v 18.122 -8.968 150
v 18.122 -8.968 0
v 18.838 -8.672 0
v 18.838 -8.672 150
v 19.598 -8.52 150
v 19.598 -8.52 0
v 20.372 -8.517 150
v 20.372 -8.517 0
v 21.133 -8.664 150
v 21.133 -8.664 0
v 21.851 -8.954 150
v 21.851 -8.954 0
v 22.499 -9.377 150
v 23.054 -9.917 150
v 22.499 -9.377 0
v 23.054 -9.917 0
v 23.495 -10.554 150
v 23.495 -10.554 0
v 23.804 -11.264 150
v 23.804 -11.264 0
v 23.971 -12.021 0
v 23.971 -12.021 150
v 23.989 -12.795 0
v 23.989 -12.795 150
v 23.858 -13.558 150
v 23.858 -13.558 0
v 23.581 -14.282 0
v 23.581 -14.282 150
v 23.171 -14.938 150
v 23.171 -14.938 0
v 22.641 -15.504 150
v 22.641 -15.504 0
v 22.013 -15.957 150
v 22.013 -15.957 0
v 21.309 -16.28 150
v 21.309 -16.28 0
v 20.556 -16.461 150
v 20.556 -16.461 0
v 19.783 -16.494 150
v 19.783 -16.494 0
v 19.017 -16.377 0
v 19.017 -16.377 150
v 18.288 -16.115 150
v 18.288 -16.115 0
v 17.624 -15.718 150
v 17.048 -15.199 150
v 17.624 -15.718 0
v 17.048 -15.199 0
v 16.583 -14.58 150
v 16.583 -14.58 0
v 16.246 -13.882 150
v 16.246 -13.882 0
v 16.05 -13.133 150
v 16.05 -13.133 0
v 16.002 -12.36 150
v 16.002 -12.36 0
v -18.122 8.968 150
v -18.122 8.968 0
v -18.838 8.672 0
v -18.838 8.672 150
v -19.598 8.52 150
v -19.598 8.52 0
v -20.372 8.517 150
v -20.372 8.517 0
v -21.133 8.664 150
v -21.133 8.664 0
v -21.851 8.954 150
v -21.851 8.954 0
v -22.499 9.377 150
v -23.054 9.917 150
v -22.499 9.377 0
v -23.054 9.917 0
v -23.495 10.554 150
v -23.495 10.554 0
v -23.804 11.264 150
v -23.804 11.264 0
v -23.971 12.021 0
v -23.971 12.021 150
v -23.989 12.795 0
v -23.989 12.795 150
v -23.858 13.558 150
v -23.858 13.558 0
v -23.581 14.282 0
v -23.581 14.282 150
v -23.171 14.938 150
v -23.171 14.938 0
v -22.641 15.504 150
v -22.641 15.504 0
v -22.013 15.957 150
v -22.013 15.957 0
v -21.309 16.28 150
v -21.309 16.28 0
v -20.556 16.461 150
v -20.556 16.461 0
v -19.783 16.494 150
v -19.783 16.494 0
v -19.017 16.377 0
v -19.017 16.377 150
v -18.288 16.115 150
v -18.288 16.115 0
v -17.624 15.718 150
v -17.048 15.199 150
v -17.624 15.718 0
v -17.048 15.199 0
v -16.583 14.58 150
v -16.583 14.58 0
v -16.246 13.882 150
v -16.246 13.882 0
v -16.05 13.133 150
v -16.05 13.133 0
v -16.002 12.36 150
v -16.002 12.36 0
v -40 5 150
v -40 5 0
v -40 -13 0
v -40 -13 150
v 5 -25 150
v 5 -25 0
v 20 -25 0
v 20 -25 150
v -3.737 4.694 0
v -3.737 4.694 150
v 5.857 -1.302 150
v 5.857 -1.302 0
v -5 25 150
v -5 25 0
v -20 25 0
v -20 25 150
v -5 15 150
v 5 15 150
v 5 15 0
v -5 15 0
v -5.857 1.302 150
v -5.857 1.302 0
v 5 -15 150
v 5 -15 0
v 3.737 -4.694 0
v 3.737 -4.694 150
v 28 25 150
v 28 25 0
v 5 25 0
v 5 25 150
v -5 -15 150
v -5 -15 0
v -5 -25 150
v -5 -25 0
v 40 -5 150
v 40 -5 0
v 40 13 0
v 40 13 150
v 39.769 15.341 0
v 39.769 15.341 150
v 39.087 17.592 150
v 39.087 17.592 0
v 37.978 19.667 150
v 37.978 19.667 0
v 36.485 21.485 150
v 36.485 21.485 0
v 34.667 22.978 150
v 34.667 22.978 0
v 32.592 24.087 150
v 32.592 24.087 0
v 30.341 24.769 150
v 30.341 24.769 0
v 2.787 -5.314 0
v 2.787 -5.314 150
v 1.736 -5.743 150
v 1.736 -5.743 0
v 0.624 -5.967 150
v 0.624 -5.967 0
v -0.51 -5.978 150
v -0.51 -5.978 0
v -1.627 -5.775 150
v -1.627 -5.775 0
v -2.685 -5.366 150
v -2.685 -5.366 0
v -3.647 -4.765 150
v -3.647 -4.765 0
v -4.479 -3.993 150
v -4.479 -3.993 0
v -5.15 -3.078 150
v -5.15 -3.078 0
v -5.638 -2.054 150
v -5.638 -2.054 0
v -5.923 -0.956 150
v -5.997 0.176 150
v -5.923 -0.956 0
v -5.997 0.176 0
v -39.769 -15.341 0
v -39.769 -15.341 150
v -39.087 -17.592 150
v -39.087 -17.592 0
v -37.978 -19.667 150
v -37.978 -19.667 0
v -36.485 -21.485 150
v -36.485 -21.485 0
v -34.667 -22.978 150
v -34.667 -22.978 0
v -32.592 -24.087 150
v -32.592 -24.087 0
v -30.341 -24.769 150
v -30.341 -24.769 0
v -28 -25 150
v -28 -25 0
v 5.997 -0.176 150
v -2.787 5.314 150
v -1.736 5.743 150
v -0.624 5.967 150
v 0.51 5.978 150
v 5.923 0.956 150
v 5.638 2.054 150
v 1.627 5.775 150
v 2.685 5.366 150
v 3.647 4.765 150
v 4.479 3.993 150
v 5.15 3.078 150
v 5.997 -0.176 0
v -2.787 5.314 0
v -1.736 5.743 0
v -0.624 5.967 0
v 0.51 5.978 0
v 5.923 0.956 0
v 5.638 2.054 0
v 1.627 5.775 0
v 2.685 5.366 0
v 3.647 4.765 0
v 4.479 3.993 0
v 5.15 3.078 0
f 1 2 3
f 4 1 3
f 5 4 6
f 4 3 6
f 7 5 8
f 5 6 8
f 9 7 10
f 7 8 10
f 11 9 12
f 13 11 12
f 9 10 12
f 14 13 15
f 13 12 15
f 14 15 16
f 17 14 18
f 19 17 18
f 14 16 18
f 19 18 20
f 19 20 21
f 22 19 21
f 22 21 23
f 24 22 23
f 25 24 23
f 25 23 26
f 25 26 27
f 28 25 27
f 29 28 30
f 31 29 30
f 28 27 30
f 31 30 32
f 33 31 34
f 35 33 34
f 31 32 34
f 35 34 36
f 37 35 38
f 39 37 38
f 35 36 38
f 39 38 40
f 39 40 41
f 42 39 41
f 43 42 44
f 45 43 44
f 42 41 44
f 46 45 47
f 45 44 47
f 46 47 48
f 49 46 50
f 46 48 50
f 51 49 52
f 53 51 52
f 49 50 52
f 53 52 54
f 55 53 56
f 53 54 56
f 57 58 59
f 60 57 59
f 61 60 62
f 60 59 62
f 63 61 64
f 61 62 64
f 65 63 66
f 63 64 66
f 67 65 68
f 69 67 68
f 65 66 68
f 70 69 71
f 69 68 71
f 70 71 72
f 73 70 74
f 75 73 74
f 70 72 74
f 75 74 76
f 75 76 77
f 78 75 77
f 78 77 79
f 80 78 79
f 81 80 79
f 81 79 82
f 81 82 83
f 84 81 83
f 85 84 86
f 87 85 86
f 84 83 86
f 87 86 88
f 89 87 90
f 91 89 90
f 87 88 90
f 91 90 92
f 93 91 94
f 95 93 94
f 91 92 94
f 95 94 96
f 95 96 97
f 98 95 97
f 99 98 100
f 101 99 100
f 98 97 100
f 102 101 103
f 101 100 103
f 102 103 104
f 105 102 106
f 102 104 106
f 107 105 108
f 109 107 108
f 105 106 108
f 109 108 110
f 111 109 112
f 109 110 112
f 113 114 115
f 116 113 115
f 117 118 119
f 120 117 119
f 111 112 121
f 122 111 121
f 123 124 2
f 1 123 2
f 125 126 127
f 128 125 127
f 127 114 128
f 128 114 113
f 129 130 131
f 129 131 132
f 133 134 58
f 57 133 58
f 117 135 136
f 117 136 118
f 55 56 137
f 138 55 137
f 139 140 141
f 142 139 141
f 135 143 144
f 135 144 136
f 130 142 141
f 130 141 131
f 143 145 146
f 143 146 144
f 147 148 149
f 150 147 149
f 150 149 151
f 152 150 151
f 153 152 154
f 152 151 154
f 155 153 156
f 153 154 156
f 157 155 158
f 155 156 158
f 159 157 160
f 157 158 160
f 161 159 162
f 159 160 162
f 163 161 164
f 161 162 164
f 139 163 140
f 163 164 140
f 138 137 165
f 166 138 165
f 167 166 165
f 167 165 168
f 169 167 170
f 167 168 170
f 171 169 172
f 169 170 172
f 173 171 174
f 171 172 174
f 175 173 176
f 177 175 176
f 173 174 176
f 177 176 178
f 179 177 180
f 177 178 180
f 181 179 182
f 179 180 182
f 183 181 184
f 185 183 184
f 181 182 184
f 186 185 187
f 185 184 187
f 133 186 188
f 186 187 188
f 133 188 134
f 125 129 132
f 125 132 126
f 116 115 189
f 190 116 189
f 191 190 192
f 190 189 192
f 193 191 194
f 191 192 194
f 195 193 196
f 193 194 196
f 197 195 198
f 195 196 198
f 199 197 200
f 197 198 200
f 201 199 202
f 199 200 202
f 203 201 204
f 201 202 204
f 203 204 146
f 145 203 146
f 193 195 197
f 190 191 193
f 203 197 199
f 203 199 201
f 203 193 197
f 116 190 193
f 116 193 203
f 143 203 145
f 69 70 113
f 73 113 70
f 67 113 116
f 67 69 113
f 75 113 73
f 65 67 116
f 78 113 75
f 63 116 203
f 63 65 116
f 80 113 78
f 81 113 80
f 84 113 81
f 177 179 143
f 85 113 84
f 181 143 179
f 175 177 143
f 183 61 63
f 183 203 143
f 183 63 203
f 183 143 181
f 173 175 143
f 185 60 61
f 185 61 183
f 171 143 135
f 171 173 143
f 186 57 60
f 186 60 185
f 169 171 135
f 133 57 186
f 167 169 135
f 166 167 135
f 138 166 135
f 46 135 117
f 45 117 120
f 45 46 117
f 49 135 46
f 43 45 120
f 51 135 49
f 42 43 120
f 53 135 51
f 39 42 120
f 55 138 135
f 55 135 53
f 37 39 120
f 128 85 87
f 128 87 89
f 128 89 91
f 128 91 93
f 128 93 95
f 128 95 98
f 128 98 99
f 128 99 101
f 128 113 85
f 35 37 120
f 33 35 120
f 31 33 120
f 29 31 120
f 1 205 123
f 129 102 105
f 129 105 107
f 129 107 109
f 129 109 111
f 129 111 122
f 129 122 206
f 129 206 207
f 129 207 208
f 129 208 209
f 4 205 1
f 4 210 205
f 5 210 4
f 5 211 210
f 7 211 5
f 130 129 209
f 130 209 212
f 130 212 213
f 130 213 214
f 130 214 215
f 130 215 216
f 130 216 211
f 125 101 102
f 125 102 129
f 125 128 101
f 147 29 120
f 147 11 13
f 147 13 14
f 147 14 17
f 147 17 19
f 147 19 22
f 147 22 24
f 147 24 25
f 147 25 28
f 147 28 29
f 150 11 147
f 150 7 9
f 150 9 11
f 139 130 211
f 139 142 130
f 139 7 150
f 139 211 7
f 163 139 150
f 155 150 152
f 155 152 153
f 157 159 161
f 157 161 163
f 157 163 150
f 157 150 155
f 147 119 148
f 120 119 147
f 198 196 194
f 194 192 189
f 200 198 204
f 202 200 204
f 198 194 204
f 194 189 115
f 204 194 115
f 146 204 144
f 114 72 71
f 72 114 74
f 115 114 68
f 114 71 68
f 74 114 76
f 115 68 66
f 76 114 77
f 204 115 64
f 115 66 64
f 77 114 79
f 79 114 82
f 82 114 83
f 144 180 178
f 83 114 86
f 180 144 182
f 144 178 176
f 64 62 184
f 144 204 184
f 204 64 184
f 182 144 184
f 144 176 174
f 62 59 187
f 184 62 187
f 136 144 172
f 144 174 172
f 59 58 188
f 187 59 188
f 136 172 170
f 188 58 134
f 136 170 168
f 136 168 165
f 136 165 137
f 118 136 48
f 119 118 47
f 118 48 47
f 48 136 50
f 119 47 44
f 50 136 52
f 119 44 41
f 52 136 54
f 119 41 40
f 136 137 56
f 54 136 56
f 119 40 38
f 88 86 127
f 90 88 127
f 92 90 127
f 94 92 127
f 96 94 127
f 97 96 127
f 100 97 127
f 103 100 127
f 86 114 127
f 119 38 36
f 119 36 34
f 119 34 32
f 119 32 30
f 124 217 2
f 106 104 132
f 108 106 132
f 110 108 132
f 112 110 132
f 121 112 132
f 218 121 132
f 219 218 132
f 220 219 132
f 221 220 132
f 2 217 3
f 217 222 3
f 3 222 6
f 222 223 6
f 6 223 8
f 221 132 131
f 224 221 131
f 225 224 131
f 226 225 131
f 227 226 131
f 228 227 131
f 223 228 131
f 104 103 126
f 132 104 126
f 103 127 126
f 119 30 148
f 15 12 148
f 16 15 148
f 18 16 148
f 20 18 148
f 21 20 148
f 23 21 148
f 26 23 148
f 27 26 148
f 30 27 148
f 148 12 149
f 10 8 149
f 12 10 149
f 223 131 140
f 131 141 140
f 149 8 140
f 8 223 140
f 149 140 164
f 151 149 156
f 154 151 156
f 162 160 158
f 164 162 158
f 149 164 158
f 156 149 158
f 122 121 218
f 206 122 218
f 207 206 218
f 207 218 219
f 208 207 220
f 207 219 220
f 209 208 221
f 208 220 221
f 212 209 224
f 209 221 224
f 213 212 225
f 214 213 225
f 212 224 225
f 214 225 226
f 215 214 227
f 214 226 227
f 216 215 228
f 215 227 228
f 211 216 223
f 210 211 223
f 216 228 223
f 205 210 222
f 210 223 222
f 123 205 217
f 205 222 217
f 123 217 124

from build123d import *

# Parameters (mm, degrees)
F1_DEPTH = 150
F2_SIZE  = 20


with BuildPart() as f1:
    # F0 (on Top) → F1 (new body)
    with BuildSketch(Plane.XY):
        with BuildLine():
            ThreePointArc((40, 13), (36.485281, 21.485281), (28, 25))
            Line((28, 25), (5, 25))
            Line((5, 25), (5, 15))
            Line((5, 15), (-5, 15))
            Line((-5, 15), (-5, 25))
            Line((-5, 25), (-40, 25))
            Line((-40, 25), (-40, -13))
            ThreePointArc((-40, -13), (-36.485281, -21.485281), (-28, -25))
            Line((-28, -25), (-5, -25))
            Line((-5, -25), (-5, -15))
            Line((-5, -15), (5, -15))
            Line((5, -15), (5, -25))
            Line((5, -25), (40, -25))
            Line((40, -25), (40, 13))
        make_face()
        with BuildLine():
            ThreePointArc((-18.122446, 8.968033), (-23.391993, 14.619996), (-16.00245, 12.360026))
            Line((-16.00245, 12.360026), (-3.737005, 4.694123))
            ThreePointArc((-3.737005, 4.694123), (3.179994, 5.08799), (5.857001, -1.30213))
            Line((5.857001, -1.30213), (18.122446, -8.968033))
            ThreePointArc((18.122446, -8.968033), (23.391993, -14.619996), (16.00245, -12.360026))
            Line((16.00245, -12.360026), (3.737005, -4.694123))
            ThreePointArc((3.737005, -4.694123), (-3.179994, -5.08799), (-5.857001, 1.30213))
            Line((-5.857001, 1.30213), (-18.122446, 8.968033))
        make_face(mode=Mode.SUBTRACT)
    extrude(amount=F1_DEPTH)

    # F2
    f2_edges = [f1.edges().sort_by_distance(p)[0] for p in [
        (-40, 25, 75),
        (40, -25, 75),
    ]]
    chamfer(f2_edges, length=F2_SIZE)


solid = f1.part
